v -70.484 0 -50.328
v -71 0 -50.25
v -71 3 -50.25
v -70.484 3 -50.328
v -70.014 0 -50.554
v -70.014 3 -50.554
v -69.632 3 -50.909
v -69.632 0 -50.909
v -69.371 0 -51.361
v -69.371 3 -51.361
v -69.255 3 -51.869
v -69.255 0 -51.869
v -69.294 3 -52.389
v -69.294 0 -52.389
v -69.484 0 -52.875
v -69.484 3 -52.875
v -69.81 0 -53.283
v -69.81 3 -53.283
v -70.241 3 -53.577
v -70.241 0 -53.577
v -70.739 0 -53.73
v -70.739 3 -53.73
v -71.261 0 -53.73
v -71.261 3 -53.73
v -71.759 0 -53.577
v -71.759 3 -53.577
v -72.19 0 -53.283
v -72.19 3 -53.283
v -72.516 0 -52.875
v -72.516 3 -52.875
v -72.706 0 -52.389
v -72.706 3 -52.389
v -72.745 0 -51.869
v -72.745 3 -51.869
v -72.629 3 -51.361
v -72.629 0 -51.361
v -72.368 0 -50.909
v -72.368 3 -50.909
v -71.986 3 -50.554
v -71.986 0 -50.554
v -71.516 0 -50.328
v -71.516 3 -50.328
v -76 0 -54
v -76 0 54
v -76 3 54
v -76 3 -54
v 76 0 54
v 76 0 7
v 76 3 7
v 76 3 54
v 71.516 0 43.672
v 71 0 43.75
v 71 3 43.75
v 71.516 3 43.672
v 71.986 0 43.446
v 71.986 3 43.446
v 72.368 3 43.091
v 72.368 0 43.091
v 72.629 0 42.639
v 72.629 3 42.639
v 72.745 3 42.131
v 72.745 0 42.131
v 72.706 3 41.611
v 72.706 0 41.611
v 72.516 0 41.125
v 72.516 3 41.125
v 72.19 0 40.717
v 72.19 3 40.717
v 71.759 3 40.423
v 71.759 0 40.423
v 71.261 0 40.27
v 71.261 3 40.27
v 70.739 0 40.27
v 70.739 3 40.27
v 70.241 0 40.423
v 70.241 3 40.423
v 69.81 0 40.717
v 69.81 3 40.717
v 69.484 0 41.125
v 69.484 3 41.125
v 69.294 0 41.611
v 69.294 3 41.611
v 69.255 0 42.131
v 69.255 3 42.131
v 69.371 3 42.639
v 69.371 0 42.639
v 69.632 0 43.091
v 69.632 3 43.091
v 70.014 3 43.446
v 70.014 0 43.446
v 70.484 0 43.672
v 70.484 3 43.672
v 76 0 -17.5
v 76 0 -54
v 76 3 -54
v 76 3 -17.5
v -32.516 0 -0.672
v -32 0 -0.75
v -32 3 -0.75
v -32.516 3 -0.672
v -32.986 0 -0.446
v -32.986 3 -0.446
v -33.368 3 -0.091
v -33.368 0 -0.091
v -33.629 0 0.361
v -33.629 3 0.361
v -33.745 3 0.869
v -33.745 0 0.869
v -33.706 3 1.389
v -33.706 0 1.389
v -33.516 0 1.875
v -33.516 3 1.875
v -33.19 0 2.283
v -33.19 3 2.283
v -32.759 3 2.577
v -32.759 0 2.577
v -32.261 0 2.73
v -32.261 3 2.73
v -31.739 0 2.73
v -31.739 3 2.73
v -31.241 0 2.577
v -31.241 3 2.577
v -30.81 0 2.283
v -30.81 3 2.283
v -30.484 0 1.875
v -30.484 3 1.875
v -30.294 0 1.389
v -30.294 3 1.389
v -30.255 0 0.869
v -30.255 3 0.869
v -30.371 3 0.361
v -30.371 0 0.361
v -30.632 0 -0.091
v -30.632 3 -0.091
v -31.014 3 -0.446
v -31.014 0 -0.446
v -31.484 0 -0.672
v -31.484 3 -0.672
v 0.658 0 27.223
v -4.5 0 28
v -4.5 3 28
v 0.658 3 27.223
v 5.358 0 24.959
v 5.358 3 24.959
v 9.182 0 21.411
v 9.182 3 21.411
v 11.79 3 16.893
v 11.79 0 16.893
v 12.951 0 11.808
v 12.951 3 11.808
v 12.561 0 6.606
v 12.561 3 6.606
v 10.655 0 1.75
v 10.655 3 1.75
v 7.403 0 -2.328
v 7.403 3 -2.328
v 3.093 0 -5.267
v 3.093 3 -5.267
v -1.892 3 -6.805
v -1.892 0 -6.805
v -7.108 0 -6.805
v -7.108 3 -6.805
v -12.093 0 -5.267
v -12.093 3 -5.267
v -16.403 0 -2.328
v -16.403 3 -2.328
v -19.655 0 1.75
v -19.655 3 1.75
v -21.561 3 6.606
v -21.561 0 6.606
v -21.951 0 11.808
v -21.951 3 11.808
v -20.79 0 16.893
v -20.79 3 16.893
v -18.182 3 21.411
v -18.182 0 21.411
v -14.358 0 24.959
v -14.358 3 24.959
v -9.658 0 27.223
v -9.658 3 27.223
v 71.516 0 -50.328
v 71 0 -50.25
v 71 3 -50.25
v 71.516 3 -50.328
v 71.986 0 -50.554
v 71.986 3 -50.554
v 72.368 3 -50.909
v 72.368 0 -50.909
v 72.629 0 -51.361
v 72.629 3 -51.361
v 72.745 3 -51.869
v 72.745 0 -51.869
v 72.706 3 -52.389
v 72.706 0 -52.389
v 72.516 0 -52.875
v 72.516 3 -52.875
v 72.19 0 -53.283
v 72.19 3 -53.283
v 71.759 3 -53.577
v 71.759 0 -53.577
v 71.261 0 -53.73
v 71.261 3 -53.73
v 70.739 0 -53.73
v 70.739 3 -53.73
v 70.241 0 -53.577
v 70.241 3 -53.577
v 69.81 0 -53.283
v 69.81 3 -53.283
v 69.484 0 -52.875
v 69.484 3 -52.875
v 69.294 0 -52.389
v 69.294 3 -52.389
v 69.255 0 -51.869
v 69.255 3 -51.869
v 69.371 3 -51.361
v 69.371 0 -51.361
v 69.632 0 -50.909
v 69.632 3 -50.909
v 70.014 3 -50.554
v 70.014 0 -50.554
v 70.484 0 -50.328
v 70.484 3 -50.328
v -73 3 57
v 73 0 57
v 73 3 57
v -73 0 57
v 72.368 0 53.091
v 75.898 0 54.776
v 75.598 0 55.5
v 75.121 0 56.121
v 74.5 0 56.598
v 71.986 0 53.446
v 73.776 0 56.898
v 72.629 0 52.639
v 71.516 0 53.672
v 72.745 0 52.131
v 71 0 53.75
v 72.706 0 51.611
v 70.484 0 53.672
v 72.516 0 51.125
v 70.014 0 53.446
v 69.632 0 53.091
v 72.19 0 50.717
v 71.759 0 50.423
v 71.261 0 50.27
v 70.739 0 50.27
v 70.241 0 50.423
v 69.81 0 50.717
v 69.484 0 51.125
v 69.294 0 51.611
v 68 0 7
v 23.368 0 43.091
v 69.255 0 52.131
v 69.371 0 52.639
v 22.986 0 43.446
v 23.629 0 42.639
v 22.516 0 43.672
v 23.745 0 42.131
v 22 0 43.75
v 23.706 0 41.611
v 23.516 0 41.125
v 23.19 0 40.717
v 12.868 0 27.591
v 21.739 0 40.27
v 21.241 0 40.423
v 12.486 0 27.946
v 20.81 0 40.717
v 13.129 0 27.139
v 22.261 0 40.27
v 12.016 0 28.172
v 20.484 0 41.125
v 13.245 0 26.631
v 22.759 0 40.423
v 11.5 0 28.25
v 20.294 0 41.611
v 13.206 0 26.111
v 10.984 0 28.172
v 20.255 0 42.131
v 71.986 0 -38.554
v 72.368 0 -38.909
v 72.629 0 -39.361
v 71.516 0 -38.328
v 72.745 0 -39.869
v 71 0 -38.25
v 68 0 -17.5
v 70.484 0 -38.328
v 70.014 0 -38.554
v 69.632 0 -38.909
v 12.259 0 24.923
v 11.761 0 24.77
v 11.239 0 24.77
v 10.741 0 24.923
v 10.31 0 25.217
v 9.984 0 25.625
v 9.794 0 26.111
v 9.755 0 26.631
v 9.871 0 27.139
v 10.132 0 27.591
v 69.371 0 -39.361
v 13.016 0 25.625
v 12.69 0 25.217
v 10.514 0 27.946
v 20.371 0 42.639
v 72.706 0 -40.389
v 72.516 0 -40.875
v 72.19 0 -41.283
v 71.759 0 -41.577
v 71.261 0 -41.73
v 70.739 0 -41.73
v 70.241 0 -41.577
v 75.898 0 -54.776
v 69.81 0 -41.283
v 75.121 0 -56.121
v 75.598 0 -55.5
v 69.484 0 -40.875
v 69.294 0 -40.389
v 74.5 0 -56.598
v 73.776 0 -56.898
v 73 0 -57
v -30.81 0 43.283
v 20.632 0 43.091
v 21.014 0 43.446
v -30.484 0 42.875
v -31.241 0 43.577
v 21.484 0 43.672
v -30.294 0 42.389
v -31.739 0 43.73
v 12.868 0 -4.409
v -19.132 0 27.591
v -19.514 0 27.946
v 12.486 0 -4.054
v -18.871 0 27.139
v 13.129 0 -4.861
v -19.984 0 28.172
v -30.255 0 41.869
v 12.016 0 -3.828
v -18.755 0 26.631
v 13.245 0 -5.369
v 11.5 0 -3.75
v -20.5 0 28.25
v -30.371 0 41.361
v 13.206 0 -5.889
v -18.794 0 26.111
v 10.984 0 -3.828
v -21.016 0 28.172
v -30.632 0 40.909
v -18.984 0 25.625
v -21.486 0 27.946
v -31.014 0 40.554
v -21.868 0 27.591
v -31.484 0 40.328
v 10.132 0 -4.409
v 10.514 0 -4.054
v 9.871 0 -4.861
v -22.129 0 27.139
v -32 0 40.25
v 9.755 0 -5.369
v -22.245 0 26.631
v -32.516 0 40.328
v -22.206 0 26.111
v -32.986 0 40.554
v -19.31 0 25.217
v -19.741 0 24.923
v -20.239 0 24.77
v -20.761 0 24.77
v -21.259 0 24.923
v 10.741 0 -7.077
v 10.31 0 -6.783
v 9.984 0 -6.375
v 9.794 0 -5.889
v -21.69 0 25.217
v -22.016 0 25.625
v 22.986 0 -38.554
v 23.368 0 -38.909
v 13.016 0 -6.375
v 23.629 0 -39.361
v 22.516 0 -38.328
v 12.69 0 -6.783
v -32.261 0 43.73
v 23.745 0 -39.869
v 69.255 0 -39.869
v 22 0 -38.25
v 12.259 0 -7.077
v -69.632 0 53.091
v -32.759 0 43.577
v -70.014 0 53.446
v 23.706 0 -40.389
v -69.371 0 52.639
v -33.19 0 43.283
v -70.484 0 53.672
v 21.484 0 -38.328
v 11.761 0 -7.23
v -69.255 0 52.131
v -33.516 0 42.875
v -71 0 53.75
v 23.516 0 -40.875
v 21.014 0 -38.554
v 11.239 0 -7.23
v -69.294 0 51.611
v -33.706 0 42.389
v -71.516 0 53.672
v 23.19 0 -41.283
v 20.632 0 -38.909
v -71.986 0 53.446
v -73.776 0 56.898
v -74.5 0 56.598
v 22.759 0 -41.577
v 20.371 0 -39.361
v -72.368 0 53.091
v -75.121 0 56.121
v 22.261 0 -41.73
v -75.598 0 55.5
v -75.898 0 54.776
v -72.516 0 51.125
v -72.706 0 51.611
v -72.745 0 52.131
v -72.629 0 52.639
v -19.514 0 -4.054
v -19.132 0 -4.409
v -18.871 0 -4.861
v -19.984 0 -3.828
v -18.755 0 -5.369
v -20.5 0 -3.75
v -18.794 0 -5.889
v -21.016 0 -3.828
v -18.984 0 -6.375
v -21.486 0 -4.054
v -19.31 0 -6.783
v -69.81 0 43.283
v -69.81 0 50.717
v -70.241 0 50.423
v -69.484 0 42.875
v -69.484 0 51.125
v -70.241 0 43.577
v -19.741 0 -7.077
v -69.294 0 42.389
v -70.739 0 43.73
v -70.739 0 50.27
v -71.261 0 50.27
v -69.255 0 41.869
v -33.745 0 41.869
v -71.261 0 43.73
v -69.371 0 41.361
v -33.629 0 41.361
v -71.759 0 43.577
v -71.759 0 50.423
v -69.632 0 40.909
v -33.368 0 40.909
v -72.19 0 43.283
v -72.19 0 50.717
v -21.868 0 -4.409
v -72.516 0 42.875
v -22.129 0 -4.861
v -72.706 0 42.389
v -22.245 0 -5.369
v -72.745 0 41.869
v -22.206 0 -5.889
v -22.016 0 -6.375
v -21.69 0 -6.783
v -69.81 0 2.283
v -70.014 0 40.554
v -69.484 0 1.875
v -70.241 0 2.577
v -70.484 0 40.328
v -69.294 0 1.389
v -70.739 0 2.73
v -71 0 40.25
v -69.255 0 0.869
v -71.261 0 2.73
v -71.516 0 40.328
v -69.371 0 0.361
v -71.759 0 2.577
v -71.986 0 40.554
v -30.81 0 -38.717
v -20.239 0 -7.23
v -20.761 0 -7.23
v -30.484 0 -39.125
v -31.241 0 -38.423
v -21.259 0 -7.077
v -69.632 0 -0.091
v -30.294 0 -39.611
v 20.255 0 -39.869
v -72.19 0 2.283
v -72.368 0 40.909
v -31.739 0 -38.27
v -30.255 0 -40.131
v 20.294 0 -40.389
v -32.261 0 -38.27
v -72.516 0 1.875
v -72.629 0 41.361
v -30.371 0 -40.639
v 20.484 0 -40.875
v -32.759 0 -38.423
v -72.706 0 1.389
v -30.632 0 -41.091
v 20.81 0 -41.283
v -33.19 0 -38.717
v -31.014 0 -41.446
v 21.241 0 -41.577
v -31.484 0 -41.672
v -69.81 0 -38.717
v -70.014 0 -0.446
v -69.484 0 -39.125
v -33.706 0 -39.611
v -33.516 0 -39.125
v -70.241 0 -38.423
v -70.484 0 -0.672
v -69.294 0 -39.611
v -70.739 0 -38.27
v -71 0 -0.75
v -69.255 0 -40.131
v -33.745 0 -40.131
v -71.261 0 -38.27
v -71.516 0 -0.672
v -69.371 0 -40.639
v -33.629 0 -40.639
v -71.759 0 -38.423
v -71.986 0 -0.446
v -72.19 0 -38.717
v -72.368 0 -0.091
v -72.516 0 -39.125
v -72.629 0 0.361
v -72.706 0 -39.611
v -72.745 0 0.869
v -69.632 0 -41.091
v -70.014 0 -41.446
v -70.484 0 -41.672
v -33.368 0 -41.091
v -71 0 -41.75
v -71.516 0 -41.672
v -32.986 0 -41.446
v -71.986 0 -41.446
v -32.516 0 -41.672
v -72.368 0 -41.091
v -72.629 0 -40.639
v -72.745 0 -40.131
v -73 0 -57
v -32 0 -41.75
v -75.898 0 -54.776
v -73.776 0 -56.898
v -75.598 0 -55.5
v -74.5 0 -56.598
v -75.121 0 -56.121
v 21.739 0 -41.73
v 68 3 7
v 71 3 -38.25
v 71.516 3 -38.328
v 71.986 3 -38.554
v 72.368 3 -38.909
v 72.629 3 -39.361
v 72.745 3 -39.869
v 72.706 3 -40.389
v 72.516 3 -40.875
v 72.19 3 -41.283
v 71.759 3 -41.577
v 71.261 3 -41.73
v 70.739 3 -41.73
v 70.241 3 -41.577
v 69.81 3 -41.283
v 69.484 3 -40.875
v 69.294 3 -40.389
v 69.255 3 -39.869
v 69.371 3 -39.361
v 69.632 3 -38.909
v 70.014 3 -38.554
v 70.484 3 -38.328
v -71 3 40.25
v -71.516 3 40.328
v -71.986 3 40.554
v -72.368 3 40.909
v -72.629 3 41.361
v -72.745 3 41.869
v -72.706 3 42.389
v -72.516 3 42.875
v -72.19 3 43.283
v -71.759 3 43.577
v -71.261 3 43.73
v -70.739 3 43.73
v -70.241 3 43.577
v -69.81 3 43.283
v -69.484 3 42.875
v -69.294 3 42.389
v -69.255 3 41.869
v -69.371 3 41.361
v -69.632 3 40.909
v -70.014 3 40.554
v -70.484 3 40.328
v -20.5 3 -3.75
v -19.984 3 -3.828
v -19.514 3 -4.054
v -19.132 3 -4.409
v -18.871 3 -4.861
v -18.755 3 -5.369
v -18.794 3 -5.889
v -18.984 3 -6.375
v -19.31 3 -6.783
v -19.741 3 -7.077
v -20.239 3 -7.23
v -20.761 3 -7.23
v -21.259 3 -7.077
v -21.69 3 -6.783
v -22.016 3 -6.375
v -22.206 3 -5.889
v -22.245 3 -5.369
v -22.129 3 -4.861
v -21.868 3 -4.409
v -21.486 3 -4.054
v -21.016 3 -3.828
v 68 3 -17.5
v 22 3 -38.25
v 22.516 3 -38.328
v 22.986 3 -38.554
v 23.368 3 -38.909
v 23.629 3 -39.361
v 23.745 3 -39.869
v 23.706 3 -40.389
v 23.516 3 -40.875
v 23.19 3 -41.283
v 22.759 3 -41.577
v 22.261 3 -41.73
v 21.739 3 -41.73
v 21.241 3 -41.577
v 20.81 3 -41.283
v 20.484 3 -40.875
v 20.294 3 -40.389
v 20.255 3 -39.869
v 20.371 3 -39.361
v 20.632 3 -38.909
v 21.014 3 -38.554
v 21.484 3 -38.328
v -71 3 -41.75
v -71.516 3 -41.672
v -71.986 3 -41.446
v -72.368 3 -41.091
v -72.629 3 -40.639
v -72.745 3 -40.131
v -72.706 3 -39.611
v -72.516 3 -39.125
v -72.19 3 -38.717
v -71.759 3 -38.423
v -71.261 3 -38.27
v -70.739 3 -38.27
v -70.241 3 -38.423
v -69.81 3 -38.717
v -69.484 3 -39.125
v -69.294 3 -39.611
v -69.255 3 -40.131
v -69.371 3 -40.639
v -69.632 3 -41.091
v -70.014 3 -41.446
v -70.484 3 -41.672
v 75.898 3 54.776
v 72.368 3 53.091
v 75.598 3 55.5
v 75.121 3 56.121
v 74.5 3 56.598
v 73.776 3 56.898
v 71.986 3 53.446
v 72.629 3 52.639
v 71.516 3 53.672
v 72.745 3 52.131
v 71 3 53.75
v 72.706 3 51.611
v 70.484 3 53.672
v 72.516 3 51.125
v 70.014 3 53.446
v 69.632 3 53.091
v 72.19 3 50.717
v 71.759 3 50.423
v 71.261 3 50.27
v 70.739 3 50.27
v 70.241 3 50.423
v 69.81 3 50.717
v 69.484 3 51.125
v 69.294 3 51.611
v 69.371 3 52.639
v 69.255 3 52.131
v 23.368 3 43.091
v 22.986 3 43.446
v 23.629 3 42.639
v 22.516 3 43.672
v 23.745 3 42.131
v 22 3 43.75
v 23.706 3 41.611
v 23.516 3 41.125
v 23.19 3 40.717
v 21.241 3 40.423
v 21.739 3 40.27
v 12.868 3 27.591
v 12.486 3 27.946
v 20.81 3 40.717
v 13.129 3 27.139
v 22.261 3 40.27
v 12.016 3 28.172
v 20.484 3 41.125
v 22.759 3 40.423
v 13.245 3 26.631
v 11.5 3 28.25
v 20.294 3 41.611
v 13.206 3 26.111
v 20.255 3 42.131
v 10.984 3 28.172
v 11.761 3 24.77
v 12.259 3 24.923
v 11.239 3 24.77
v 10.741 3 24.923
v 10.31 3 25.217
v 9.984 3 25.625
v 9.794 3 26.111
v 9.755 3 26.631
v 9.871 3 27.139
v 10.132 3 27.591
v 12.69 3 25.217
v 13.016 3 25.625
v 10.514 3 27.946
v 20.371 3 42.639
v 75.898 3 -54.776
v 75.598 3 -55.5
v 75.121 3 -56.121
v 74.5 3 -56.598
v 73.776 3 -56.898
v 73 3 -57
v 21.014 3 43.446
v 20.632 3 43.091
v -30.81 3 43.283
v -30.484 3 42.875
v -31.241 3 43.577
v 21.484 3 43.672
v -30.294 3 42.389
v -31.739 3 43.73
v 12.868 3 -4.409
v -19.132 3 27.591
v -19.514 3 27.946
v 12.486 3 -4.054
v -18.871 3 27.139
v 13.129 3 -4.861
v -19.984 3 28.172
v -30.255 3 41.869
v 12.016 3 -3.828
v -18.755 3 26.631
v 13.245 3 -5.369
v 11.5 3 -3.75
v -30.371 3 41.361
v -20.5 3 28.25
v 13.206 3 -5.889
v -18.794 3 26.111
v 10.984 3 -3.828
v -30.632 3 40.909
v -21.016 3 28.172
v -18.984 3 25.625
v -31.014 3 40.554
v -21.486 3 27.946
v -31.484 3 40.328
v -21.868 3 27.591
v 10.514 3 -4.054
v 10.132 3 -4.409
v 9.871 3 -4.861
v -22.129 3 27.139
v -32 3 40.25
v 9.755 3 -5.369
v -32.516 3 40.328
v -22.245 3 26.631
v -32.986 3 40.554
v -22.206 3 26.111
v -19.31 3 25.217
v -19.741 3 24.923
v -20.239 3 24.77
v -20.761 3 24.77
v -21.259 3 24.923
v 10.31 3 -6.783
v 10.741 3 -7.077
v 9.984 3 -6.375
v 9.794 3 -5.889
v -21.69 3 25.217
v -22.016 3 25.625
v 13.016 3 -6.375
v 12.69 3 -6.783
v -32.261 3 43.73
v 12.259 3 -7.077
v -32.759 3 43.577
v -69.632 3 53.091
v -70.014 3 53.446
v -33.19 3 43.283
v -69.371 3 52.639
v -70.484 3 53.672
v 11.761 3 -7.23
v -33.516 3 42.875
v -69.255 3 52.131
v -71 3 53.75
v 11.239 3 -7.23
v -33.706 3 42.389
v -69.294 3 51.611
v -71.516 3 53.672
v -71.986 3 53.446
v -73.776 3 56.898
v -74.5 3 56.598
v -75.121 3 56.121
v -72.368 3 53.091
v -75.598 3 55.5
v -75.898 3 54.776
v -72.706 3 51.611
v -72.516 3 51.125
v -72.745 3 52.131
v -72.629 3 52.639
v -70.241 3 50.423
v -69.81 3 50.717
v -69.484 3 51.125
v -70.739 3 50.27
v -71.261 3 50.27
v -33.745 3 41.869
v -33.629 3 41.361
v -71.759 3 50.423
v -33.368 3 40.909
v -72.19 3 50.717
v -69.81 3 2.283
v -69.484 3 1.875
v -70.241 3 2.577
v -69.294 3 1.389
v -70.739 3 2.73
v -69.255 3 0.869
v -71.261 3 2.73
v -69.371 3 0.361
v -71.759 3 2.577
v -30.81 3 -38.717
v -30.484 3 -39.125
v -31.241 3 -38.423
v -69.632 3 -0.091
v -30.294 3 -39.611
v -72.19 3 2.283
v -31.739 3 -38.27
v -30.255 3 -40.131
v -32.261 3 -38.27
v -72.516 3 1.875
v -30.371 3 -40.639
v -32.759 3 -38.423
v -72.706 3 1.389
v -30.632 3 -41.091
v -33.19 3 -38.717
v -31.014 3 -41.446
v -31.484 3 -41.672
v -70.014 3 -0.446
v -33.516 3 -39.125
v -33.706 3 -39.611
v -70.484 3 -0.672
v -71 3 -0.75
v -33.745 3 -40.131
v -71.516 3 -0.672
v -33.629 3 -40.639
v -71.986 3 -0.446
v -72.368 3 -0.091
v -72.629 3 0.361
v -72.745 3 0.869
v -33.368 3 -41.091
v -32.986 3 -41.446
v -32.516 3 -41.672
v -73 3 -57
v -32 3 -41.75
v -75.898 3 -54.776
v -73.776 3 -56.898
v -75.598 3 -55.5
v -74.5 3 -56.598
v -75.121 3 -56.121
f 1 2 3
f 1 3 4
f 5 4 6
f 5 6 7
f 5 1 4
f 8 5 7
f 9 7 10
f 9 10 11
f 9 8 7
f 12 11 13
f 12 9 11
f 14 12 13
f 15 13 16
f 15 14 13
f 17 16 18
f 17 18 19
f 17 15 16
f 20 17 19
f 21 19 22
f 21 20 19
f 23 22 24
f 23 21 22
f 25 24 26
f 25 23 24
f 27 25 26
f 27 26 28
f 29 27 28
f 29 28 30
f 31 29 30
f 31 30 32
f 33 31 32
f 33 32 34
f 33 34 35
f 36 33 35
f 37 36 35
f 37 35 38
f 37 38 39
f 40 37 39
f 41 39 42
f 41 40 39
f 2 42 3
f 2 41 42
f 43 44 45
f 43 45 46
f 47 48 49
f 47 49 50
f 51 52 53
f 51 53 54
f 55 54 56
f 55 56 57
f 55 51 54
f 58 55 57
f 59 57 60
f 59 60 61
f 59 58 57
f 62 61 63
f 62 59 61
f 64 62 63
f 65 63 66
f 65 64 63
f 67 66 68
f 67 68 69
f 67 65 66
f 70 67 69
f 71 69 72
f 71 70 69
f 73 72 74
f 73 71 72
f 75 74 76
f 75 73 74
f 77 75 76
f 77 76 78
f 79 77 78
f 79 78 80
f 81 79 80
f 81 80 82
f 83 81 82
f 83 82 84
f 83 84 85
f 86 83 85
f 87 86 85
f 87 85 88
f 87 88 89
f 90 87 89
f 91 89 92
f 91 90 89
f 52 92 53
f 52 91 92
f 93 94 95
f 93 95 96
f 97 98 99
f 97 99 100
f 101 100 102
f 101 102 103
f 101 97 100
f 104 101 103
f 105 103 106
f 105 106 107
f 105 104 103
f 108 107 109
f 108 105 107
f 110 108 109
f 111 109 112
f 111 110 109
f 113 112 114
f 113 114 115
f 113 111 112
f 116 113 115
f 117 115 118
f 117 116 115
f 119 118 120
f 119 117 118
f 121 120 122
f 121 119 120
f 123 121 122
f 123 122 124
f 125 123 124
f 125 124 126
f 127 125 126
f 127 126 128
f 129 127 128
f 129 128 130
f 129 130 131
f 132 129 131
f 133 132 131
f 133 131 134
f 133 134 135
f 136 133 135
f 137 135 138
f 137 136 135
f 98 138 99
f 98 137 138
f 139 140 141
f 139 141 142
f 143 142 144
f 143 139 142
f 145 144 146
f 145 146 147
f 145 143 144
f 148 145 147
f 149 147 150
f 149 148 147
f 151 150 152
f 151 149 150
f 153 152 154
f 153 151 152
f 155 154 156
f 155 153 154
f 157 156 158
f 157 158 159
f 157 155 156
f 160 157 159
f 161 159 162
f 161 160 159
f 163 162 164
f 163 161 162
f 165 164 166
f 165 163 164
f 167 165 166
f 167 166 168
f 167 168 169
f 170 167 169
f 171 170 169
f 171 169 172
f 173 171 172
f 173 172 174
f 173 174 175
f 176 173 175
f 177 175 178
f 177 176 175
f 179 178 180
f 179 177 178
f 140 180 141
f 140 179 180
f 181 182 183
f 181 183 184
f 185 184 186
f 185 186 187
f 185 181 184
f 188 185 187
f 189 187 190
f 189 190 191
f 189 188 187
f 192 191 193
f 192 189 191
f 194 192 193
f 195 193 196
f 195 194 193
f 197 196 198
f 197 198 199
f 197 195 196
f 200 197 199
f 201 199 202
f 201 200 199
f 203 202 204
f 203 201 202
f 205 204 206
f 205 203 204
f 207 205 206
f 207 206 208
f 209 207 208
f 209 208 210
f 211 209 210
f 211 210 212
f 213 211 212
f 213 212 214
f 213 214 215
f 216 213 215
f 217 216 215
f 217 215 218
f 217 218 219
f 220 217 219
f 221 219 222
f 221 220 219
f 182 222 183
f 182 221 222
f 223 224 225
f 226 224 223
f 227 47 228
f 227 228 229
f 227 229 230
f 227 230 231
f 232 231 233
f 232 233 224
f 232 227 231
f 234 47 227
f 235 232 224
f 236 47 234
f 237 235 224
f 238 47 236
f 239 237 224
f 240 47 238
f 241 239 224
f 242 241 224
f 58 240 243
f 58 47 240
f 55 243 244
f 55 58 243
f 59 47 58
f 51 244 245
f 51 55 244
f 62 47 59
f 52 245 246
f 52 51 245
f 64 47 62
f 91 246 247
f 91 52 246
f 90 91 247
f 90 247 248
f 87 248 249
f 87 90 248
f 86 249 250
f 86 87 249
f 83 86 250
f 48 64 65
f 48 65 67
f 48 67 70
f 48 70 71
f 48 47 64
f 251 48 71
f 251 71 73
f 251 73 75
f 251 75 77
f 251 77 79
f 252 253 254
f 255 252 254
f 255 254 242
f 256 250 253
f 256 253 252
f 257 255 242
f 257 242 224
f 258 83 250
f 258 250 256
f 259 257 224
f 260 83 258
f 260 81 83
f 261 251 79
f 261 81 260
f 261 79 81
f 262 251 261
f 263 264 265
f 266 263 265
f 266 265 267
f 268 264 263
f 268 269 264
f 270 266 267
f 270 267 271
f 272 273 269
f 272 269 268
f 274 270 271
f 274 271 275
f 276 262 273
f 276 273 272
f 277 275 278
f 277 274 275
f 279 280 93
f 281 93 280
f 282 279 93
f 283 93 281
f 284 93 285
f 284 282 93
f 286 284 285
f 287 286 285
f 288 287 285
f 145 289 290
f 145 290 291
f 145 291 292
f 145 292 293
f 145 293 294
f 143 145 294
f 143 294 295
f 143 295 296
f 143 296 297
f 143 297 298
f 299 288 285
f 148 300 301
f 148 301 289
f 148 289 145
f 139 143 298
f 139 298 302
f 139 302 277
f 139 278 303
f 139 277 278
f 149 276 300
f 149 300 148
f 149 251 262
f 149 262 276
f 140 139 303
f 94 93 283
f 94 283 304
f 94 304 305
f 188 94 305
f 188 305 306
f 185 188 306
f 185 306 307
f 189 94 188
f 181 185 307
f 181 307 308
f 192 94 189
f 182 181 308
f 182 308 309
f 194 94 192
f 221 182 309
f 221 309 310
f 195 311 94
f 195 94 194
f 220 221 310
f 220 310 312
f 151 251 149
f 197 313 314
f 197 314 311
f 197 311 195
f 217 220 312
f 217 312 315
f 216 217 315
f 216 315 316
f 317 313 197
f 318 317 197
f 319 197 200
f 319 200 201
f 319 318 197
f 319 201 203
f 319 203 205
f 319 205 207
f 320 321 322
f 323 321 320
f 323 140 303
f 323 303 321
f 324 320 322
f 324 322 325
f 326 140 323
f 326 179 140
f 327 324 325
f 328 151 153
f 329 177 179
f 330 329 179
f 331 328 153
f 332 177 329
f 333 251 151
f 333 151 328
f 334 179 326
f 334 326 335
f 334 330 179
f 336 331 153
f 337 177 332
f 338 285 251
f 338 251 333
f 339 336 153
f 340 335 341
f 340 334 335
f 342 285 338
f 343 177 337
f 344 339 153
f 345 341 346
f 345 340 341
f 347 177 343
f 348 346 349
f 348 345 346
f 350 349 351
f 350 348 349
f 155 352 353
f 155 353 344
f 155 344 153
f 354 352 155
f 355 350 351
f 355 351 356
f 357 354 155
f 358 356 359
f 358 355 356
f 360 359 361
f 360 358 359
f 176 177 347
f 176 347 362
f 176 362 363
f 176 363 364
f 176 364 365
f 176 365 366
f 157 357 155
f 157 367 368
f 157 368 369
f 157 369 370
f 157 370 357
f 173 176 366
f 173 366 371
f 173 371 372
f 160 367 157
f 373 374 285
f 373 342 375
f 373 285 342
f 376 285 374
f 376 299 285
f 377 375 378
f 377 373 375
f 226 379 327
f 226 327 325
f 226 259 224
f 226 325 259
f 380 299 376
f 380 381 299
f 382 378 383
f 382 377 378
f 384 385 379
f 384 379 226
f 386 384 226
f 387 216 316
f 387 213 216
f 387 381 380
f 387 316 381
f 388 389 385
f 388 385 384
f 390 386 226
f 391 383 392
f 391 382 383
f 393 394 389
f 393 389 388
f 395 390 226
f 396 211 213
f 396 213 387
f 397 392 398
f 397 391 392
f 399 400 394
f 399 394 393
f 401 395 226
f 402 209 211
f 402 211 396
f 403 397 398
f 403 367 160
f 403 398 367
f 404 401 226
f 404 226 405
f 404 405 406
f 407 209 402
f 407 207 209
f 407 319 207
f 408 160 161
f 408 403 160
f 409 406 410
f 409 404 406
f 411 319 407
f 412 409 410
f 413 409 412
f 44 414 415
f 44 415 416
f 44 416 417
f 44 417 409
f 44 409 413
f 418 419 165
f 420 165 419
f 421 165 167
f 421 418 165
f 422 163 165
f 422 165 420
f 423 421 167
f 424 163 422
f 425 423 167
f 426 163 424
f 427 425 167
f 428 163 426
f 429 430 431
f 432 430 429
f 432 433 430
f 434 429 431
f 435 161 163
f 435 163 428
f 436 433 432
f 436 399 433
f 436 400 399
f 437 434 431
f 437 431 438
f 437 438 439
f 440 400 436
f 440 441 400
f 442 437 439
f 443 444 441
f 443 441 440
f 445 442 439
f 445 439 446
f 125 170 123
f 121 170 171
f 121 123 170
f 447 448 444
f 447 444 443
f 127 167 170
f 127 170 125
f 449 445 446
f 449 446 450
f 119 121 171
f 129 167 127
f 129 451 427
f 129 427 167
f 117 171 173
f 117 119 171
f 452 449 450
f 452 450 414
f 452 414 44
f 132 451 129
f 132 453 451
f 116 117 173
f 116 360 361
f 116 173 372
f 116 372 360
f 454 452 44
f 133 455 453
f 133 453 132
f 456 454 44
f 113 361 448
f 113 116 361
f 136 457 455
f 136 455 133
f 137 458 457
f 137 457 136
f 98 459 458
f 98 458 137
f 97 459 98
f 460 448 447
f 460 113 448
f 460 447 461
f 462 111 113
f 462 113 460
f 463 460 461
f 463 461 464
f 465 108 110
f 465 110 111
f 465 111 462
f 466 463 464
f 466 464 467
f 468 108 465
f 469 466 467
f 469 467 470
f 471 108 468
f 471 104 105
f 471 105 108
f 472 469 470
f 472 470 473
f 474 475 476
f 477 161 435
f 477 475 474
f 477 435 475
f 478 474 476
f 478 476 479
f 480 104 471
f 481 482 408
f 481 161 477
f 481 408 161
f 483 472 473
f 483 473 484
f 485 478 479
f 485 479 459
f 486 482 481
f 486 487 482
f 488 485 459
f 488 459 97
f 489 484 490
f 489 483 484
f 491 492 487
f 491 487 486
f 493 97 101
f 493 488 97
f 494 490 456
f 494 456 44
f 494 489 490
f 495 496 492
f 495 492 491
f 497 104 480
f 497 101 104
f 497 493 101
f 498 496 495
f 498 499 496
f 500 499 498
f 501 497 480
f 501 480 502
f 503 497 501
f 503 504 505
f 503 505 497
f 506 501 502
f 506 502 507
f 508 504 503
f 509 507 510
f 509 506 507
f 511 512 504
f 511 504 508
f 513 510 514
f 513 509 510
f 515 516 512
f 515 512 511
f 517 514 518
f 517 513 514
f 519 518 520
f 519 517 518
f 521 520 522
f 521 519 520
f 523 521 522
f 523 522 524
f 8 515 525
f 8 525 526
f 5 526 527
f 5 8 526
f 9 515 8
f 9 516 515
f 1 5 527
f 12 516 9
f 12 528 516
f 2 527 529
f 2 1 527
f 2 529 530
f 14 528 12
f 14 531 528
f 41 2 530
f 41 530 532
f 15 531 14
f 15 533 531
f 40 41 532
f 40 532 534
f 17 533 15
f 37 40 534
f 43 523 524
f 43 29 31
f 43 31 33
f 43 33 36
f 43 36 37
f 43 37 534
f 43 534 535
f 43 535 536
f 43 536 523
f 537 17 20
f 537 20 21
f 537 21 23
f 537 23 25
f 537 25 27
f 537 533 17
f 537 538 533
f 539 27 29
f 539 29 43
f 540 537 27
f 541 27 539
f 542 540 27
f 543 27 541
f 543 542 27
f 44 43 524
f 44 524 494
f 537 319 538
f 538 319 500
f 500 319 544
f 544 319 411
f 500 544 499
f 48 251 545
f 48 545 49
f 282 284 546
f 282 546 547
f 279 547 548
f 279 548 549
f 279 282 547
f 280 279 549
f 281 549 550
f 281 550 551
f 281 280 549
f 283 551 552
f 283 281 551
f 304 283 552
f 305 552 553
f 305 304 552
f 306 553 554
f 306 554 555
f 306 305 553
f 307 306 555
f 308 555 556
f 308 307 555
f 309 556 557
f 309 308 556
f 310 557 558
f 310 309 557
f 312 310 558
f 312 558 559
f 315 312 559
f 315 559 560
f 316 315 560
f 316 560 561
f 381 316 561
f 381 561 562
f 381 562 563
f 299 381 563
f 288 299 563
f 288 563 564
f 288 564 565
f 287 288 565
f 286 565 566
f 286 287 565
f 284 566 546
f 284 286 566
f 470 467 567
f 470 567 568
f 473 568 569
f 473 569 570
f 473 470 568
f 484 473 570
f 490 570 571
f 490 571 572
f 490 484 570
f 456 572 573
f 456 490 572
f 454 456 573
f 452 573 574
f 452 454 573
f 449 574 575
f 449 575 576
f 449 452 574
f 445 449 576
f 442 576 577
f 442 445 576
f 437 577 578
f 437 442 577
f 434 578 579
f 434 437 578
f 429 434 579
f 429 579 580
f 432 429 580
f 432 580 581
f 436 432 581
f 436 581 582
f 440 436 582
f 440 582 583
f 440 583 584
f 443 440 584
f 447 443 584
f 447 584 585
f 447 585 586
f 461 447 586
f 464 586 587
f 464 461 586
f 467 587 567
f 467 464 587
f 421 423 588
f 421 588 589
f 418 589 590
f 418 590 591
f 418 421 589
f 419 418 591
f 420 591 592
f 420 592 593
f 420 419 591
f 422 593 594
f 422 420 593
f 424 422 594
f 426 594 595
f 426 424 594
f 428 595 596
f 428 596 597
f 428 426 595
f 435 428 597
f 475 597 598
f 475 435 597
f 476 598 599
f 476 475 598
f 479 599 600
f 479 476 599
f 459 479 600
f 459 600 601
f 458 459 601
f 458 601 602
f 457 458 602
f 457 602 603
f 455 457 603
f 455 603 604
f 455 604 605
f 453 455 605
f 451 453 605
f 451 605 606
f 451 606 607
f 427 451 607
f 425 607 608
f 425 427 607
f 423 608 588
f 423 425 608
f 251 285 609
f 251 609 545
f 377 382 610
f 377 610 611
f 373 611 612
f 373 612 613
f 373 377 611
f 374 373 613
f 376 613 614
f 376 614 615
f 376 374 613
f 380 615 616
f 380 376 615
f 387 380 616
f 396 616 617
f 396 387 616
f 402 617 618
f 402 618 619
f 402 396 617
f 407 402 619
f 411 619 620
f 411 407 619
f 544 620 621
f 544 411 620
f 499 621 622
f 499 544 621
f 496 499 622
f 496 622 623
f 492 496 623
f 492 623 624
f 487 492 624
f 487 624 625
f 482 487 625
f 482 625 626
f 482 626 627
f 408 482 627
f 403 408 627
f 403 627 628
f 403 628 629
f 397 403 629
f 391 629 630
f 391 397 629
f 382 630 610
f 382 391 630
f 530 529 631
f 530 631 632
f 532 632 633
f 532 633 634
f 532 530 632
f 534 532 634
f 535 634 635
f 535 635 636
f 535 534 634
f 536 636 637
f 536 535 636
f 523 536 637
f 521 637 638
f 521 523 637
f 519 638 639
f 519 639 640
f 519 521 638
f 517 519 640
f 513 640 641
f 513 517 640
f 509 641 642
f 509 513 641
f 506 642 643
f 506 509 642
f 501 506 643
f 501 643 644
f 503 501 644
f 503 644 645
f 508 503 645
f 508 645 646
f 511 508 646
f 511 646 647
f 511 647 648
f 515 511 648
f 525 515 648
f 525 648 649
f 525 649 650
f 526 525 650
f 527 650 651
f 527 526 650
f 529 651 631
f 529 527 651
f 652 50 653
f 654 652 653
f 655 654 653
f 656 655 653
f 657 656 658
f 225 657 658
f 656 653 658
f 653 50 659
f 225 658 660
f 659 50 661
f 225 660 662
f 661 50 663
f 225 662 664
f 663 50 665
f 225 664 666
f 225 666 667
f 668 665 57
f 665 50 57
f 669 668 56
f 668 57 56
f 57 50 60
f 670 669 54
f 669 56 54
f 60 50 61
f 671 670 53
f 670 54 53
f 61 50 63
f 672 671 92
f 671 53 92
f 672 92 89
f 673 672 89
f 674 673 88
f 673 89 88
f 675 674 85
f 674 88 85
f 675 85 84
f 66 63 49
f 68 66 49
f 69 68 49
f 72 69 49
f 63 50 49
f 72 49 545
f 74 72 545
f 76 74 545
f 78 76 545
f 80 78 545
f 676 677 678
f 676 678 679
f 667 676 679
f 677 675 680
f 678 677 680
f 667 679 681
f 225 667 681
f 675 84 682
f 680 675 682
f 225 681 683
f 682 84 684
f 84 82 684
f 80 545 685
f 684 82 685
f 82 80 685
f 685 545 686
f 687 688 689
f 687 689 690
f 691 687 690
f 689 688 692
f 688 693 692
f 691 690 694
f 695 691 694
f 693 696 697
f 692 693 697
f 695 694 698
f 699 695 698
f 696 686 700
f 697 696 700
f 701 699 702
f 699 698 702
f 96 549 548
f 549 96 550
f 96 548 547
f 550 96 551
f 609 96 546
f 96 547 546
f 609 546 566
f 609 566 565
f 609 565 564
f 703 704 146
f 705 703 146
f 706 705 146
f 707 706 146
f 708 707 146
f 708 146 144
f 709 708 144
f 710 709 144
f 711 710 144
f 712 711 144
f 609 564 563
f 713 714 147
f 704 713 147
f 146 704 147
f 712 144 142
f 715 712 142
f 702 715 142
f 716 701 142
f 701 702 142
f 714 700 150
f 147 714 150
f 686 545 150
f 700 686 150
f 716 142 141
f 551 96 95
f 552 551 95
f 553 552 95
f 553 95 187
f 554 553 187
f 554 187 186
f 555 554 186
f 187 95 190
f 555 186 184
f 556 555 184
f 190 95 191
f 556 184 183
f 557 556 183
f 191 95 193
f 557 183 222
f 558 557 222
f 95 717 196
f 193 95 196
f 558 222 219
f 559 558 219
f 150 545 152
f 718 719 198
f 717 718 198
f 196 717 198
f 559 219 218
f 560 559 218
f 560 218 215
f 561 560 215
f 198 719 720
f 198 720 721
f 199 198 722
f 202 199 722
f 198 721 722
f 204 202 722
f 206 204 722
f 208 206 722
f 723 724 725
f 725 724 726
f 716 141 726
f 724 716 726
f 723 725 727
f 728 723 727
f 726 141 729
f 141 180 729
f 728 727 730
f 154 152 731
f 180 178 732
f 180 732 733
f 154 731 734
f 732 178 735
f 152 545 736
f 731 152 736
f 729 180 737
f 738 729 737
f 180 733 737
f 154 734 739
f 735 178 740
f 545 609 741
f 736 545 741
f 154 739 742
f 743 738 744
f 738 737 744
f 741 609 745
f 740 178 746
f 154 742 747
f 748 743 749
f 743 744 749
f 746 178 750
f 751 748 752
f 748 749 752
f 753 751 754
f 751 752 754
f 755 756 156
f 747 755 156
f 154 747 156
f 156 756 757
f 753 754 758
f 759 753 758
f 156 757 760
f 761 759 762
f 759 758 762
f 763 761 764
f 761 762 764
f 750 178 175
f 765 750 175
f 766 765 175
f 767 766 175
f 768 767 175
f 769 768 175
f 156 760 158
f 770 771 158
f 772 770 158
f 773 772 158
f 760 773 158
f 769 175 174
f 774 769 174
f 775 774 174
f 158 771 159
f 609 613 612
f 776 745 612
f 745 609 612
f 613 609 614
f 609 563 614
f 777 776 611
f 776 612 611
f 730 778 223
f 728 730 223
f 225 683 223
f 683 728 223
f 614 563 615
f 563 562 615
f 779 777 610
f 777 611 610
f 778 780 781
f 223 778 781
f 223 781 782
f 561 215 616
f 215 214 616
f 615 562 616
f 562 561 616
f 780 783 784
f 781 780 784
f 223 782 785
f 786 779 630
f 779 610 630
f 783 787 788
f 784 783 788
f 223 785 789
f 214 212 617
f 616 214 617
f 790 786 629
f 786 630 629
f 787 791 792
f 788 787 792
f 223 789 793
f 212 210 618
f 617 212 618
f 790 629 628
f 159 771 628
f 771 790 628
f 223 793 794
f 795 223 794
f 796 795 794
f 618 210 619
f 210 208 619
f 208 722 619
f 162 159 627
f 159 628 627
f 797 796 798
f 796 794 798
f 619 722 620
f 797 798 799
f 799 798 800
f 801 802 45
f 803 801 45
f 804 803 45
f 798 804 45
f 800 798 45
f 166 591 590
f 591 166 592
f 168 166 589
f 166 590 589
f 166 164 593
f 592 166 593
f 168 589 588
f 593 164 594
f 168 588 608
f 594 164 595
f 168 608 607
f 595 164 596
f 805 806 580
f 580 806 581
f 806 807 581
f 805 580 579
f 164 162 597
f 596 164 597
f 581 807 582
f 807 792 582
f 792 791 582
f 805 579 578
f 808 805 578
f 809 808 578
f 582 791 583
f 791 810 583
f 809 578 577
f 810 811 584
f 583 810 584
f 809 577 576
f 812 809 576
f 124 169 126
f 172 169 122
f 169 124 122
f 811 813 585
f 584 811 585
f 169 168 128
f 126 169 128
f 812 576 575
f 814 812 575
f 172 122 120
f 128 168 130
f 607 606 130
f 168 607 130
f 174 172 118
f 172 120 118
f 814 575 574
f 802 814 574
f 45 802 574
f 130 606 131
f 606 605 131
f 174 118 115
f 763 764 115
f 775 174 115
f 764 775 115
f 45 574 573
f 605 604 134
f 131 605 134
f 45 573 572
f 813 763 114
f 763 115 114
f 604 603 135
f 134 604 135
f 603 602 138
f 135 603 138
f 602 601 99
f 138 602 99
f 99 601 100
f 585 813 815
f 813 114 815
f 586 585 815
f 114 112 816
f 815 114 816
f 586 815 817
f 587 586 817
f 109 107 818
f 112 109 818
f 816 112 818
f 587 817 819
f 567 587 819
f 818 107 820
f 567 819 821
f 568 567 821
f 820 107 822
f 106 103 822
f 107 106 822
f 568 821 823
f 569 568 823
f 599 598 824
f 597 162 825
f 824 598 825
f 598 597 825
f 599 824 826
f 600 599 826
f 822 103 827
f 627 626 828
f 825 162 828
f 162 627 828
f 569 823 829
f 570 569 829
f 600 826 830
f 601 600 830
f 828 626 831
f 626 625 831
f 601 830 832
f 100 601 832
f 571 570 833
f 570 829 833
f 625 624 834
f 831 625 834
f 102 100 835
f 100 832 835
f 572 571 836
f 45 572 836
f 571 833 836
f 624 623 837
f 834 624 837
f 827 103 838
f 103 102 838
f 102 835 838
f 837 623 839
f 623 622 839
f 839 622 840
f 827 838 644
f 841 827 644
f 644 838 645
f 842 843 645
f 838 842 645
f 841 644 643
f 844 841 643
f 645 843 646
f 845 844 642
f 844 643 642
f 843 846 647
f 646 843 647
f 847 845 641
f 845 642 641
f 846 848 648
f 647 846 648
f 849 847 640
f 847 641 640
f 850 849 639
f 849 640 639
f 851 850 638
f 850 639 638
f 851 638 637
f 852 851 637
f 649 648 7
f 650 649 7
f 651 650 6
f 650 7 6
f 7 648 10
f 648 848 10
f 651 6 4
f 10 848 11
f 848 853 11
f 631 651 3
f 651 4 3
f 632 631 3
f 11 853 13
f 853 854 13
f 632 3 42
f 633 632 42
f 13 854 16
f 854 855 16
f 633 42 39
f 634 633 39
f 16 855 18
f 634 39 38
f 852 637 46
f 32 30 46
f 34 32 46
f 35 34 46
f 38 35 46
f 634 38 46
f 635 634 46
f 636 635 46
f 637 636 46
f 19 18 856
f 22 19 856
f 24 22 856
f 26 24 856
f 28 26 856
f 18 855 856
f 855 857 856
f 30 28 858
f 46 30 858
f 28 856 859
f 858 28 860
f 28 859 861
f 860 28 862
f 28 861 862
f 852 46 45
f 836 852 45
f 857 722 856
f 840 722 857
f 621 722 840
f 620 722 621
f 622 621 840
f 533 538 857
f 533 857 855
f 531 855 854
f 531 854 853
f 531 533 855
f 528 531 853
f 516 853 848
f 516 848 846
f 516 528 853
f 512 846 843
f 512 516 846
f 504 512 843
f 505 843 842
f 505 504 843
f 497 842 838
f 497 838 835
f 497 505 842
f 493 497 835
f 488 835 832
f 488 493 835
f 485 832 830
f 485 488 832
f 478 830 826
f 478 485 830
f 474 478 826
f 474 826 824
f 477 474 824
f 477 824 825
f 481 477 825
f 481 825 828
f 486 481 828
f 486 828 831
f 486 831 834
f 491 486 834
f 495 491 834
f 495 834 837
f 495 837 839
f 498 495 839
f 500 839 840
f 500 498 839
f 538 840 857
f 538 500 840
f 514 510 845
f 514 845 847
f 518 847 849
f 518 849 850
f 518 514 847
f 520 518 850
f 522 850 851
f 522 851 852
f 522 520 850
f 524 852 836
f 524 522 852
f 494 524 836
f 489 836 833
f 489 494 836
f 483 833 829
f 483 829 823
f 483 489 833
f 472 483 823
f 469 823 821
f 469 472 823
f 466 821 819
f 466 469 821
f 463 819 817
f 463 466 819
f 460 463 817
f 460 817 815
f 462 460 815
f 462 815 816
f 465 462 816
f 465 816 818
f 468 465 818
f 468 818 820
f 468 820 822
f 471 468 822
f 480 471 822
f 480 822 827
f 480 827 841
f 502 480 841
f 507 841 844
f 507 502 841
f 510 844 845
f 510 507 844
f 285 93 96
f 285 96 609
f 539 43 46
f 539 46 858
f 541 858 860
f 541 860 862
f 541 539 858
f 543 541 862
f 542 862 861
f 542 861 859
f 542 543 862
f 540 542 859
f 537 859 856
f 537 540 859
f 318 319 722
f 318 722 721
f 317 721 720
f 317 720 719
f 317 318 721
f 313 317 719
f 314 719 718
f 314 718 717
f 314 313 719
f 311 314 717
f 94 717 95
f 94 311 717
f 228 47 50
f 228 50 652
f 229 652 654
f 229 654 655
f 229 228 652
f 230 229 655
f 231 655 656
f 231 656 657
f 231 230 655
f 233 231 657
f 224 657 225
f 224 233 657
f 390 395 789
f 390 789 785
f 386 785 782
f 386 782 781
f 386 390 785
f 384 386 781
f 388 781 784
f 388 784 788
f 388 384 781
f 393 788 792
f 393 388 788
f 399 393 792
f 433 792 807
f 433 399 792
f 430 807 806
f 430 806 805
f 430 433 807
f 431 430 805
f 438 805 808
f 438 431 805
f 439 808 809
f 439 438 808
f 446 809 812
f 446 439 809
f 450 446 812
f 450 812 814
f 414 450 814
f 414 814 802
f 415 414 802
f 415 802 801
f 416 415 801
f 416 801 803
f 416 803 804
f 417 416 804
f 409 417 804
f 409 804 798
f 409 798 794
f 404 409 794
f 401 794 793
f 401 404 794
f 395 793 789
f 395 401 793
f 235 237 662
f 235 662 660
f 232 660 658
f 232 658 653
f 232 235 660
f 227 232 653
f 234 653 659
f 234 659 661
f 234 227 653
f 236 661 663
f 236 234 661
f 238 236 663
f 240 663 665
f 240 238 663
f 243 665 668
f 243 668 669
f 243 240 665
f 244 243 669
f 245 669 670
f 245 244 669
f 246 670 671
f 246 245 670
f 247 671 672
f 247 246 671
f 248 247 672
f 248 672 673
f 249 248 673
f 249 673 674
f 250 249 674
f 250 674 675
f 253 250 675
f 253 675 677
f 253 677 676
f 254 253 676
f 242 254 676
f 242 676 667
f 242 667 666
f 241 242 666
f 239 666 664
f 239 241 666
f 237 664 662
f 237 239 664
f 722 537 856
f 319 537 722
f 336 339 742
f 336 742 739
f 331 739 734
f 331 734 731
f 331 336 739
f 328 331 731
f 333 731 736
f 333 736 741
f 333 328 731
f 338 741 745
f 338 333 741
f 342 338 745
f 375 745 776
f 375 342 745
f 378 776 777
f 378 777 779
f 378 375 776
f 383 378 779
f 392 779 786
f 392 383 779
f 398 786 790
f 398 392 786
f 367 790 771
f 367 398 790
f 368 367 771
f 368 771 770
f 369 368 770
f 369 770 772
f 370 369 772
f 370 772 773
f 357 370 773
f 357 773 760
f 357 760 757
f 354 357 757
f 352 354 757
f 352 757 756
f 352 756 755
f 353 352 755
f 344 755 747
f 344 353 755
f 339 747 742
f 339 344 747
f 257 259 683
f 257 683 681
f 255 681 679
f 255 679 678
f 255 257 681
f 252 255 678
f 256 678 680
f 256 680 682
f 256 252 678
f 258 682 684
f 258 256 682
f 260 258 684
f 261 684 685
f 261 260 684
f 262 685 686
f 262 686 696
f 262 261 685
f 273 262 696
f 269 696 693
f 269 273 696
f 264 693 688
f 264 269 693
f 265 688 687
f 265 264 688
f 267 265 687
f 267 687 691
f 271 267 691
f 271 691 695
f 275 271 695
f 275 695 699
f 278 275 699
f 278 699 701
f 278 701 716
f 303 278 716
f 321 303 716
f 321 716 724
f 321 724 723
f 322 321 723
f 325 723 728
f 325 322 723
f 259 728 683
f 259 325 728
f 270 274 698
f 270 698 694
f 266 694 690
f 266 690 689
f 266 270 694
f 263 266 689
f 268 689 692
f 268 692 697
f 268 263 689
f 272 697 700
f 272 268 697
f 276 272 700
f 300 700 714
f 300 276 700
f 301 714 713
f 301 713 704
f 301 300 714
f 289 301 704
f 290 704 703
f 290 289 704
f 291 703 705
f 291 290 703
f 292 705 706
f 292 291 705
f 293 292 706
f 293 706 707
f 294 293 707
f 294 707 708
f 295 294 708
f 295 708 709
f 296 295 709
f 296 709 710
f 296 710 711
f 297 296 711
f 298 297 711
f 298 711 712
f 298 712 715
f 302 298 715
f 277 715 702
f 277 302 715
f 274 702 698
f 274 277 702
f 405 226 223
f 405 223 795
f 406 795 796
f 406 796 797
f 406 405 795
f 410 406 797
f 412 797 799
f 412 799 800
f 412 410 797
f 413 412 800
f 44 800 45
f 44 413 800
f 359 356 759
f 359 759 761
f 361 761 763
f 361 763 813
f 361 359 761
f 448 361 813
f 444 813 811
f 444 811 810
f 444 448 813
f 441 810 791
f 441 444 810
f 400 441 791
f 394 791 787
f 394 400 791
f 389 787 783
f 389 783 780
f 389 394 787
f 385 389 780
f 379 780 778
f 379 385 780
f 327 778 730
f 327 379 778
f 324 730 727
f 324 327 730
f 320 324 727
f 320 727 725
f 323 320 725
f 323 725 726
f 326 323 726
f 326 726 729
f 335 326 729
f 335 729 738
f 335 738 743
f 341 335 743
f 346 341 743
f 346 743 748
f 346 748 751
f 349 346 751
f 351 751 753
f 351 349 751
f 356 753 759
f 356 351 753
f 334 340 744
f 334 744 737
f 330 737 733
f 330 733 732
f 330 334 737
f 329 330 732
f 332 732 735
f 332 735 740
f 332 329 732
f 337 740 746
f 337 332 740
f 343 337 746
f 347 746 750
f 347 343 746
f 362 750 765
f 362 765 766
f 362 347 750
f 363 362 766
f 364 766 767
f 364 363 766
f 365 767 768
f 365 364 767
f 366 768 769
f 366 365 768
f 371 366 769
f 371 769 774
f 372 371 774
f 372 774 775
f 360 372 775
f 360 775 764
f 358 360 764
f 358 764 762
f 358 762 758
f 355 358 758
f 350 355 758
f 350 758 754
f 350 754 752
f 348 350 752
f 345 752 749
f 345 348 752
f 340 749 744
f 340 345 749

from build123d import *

# Parameters (mm, degrees)
SKETCH_1_R      = 1.75
SKETCH_1_R_2    = 17.5
EXTRUDE_1_DEPTH = 3


with BuildPart() as part:
    # 草图1 → 凸台-拉伸1 (new body)
    with BuildSketch(Plane(origin=(0, 0, 0), x_dir=(1, 0, 0), z_dir=(0, 1, 0))):
        with BuildLine():
            Line((76, 17.5), (68, 17.5))
            Line((68, 17.5), (68, -7))
            Line((68, -7), (76, -7))
            Line((76, -7), (76, -54))
            ThreePointArc((76, -54), (75.121320344, -56.121320344), (73, -57))
            Line((73, -57), (-73, -57))
            ThreePointArc((-73, -57), (-75.121320344, -56.121320344), (-76, -54))
            Line((-76, -54), (-76, 54))
            ThreePointArc((-76, 54), (-75.121320344, 56.121320344), (-73, 57))
            Line((-73, 57), (73, 57))
            ThreePointArc((73, 57), (75.121320344, 56.121320344), (76, 54))
            Line((76, 54), (76, 17.5))
        make_face()
        with Locations(Location((-71, 52, 0), (0, 0, 270))):
            Circle(SKETCH_1_R, mode=Mode.SUBTRACT)
        with Locations(Location((71, 52, 0), (0, 0, 270))):
            Circle(SKETCH_1_R, mode=Mode.SUBTRACT)
        with Locations(Location((71, -52, 0), (0, 0, 270))):
            Circle(SKETCH_1_R, mode=Mode.SUBTRACT)
        with Locations(Location((-71, -52, 0), (0, 0, 270))):
            Circle(SKETCH_1_R, mode=Mode.SUBTRACT)
        with Locations(Location((-4.5, -10.5, 0), (0, 0, 270))):
            Circle(SKETCH_1_R_2, mode=Mode.SUBTRACT)
        with Locations(Location((-20.5, 5.5, 0), (0, 0, 270))):
            Circle(SKETCH_1_R, mode=Mode.SUBTRACT)
        with Locations(Location((11.5, 5.5, 0), (0, 0, 270))):
            Circle(SKETCH_1_R, mode=Mode.SUBTRACT)
        with Locations(Location((11.5, -26.5, 0), (0, 0, 270))):
            Circle(SKETCH_1_R, mode=Mode.SUBTRACT)
        with Locations(Location((-20.5, -26.5, 0), (0, 0, 270))):
            Circle(SKETCH_1_R, mode=Mode.SUBTRACT)
        with Locations(Location((71, 40, 0), (0, 0, 270))):
            Circle(SKETCH_1_R, mode=Mode.SUBTRACT)
        with Locations(Location((22, 40, 0), (0, 0, 270))):
            Circle(SKETCH_1_R, mode=Mode.SUBTRACT)
        with Locations(Location((22, -42, 0), (0, 0, 270))):
            Circle(SKETCH_1_R, mode=Mode.SUBTRACT)
        with Locations(Location((71, -42, 0), (0, 0, 270))):
            Circle(SKETCH_1_R, mode=Mode.SUBTRACT)
        with Locations(Location((-71, 40, 0), (0, 0, 90))):
            Circle(SKETCH_1_R, mode=Mode.SUBTRACT)
        with Locations(Location((-32, 40, 0), (0, 0, 90))):
            Circle(SKETCH_1_R, mode=Mode.SUBTRACT)
        with Locations(Location((-32, -1, 0), (0, 0, 90))):
            Circle(SKETCH_1_R, mode=Mode.SUBTRACT)
        with Locations(Location((-32, -42, 0), (0, 0, 90))):
            Circle(SKETCH_1_R, mode=Mode.SUBTRACT)
        with Locations(Location((-71, -1, 0), (0, 0, 90))):
            Circle(SKETCH_1_R, mode=Mode.SUBTRACT)
        with Locations(Location((-71, -42, 0), (0, 0, 90))):
            Circle(SKETCH_1_R, mode=Mode.SUBTRACT)
    extrude(amount=EXTRUDE_1_DEPTH)


solid = part.part
